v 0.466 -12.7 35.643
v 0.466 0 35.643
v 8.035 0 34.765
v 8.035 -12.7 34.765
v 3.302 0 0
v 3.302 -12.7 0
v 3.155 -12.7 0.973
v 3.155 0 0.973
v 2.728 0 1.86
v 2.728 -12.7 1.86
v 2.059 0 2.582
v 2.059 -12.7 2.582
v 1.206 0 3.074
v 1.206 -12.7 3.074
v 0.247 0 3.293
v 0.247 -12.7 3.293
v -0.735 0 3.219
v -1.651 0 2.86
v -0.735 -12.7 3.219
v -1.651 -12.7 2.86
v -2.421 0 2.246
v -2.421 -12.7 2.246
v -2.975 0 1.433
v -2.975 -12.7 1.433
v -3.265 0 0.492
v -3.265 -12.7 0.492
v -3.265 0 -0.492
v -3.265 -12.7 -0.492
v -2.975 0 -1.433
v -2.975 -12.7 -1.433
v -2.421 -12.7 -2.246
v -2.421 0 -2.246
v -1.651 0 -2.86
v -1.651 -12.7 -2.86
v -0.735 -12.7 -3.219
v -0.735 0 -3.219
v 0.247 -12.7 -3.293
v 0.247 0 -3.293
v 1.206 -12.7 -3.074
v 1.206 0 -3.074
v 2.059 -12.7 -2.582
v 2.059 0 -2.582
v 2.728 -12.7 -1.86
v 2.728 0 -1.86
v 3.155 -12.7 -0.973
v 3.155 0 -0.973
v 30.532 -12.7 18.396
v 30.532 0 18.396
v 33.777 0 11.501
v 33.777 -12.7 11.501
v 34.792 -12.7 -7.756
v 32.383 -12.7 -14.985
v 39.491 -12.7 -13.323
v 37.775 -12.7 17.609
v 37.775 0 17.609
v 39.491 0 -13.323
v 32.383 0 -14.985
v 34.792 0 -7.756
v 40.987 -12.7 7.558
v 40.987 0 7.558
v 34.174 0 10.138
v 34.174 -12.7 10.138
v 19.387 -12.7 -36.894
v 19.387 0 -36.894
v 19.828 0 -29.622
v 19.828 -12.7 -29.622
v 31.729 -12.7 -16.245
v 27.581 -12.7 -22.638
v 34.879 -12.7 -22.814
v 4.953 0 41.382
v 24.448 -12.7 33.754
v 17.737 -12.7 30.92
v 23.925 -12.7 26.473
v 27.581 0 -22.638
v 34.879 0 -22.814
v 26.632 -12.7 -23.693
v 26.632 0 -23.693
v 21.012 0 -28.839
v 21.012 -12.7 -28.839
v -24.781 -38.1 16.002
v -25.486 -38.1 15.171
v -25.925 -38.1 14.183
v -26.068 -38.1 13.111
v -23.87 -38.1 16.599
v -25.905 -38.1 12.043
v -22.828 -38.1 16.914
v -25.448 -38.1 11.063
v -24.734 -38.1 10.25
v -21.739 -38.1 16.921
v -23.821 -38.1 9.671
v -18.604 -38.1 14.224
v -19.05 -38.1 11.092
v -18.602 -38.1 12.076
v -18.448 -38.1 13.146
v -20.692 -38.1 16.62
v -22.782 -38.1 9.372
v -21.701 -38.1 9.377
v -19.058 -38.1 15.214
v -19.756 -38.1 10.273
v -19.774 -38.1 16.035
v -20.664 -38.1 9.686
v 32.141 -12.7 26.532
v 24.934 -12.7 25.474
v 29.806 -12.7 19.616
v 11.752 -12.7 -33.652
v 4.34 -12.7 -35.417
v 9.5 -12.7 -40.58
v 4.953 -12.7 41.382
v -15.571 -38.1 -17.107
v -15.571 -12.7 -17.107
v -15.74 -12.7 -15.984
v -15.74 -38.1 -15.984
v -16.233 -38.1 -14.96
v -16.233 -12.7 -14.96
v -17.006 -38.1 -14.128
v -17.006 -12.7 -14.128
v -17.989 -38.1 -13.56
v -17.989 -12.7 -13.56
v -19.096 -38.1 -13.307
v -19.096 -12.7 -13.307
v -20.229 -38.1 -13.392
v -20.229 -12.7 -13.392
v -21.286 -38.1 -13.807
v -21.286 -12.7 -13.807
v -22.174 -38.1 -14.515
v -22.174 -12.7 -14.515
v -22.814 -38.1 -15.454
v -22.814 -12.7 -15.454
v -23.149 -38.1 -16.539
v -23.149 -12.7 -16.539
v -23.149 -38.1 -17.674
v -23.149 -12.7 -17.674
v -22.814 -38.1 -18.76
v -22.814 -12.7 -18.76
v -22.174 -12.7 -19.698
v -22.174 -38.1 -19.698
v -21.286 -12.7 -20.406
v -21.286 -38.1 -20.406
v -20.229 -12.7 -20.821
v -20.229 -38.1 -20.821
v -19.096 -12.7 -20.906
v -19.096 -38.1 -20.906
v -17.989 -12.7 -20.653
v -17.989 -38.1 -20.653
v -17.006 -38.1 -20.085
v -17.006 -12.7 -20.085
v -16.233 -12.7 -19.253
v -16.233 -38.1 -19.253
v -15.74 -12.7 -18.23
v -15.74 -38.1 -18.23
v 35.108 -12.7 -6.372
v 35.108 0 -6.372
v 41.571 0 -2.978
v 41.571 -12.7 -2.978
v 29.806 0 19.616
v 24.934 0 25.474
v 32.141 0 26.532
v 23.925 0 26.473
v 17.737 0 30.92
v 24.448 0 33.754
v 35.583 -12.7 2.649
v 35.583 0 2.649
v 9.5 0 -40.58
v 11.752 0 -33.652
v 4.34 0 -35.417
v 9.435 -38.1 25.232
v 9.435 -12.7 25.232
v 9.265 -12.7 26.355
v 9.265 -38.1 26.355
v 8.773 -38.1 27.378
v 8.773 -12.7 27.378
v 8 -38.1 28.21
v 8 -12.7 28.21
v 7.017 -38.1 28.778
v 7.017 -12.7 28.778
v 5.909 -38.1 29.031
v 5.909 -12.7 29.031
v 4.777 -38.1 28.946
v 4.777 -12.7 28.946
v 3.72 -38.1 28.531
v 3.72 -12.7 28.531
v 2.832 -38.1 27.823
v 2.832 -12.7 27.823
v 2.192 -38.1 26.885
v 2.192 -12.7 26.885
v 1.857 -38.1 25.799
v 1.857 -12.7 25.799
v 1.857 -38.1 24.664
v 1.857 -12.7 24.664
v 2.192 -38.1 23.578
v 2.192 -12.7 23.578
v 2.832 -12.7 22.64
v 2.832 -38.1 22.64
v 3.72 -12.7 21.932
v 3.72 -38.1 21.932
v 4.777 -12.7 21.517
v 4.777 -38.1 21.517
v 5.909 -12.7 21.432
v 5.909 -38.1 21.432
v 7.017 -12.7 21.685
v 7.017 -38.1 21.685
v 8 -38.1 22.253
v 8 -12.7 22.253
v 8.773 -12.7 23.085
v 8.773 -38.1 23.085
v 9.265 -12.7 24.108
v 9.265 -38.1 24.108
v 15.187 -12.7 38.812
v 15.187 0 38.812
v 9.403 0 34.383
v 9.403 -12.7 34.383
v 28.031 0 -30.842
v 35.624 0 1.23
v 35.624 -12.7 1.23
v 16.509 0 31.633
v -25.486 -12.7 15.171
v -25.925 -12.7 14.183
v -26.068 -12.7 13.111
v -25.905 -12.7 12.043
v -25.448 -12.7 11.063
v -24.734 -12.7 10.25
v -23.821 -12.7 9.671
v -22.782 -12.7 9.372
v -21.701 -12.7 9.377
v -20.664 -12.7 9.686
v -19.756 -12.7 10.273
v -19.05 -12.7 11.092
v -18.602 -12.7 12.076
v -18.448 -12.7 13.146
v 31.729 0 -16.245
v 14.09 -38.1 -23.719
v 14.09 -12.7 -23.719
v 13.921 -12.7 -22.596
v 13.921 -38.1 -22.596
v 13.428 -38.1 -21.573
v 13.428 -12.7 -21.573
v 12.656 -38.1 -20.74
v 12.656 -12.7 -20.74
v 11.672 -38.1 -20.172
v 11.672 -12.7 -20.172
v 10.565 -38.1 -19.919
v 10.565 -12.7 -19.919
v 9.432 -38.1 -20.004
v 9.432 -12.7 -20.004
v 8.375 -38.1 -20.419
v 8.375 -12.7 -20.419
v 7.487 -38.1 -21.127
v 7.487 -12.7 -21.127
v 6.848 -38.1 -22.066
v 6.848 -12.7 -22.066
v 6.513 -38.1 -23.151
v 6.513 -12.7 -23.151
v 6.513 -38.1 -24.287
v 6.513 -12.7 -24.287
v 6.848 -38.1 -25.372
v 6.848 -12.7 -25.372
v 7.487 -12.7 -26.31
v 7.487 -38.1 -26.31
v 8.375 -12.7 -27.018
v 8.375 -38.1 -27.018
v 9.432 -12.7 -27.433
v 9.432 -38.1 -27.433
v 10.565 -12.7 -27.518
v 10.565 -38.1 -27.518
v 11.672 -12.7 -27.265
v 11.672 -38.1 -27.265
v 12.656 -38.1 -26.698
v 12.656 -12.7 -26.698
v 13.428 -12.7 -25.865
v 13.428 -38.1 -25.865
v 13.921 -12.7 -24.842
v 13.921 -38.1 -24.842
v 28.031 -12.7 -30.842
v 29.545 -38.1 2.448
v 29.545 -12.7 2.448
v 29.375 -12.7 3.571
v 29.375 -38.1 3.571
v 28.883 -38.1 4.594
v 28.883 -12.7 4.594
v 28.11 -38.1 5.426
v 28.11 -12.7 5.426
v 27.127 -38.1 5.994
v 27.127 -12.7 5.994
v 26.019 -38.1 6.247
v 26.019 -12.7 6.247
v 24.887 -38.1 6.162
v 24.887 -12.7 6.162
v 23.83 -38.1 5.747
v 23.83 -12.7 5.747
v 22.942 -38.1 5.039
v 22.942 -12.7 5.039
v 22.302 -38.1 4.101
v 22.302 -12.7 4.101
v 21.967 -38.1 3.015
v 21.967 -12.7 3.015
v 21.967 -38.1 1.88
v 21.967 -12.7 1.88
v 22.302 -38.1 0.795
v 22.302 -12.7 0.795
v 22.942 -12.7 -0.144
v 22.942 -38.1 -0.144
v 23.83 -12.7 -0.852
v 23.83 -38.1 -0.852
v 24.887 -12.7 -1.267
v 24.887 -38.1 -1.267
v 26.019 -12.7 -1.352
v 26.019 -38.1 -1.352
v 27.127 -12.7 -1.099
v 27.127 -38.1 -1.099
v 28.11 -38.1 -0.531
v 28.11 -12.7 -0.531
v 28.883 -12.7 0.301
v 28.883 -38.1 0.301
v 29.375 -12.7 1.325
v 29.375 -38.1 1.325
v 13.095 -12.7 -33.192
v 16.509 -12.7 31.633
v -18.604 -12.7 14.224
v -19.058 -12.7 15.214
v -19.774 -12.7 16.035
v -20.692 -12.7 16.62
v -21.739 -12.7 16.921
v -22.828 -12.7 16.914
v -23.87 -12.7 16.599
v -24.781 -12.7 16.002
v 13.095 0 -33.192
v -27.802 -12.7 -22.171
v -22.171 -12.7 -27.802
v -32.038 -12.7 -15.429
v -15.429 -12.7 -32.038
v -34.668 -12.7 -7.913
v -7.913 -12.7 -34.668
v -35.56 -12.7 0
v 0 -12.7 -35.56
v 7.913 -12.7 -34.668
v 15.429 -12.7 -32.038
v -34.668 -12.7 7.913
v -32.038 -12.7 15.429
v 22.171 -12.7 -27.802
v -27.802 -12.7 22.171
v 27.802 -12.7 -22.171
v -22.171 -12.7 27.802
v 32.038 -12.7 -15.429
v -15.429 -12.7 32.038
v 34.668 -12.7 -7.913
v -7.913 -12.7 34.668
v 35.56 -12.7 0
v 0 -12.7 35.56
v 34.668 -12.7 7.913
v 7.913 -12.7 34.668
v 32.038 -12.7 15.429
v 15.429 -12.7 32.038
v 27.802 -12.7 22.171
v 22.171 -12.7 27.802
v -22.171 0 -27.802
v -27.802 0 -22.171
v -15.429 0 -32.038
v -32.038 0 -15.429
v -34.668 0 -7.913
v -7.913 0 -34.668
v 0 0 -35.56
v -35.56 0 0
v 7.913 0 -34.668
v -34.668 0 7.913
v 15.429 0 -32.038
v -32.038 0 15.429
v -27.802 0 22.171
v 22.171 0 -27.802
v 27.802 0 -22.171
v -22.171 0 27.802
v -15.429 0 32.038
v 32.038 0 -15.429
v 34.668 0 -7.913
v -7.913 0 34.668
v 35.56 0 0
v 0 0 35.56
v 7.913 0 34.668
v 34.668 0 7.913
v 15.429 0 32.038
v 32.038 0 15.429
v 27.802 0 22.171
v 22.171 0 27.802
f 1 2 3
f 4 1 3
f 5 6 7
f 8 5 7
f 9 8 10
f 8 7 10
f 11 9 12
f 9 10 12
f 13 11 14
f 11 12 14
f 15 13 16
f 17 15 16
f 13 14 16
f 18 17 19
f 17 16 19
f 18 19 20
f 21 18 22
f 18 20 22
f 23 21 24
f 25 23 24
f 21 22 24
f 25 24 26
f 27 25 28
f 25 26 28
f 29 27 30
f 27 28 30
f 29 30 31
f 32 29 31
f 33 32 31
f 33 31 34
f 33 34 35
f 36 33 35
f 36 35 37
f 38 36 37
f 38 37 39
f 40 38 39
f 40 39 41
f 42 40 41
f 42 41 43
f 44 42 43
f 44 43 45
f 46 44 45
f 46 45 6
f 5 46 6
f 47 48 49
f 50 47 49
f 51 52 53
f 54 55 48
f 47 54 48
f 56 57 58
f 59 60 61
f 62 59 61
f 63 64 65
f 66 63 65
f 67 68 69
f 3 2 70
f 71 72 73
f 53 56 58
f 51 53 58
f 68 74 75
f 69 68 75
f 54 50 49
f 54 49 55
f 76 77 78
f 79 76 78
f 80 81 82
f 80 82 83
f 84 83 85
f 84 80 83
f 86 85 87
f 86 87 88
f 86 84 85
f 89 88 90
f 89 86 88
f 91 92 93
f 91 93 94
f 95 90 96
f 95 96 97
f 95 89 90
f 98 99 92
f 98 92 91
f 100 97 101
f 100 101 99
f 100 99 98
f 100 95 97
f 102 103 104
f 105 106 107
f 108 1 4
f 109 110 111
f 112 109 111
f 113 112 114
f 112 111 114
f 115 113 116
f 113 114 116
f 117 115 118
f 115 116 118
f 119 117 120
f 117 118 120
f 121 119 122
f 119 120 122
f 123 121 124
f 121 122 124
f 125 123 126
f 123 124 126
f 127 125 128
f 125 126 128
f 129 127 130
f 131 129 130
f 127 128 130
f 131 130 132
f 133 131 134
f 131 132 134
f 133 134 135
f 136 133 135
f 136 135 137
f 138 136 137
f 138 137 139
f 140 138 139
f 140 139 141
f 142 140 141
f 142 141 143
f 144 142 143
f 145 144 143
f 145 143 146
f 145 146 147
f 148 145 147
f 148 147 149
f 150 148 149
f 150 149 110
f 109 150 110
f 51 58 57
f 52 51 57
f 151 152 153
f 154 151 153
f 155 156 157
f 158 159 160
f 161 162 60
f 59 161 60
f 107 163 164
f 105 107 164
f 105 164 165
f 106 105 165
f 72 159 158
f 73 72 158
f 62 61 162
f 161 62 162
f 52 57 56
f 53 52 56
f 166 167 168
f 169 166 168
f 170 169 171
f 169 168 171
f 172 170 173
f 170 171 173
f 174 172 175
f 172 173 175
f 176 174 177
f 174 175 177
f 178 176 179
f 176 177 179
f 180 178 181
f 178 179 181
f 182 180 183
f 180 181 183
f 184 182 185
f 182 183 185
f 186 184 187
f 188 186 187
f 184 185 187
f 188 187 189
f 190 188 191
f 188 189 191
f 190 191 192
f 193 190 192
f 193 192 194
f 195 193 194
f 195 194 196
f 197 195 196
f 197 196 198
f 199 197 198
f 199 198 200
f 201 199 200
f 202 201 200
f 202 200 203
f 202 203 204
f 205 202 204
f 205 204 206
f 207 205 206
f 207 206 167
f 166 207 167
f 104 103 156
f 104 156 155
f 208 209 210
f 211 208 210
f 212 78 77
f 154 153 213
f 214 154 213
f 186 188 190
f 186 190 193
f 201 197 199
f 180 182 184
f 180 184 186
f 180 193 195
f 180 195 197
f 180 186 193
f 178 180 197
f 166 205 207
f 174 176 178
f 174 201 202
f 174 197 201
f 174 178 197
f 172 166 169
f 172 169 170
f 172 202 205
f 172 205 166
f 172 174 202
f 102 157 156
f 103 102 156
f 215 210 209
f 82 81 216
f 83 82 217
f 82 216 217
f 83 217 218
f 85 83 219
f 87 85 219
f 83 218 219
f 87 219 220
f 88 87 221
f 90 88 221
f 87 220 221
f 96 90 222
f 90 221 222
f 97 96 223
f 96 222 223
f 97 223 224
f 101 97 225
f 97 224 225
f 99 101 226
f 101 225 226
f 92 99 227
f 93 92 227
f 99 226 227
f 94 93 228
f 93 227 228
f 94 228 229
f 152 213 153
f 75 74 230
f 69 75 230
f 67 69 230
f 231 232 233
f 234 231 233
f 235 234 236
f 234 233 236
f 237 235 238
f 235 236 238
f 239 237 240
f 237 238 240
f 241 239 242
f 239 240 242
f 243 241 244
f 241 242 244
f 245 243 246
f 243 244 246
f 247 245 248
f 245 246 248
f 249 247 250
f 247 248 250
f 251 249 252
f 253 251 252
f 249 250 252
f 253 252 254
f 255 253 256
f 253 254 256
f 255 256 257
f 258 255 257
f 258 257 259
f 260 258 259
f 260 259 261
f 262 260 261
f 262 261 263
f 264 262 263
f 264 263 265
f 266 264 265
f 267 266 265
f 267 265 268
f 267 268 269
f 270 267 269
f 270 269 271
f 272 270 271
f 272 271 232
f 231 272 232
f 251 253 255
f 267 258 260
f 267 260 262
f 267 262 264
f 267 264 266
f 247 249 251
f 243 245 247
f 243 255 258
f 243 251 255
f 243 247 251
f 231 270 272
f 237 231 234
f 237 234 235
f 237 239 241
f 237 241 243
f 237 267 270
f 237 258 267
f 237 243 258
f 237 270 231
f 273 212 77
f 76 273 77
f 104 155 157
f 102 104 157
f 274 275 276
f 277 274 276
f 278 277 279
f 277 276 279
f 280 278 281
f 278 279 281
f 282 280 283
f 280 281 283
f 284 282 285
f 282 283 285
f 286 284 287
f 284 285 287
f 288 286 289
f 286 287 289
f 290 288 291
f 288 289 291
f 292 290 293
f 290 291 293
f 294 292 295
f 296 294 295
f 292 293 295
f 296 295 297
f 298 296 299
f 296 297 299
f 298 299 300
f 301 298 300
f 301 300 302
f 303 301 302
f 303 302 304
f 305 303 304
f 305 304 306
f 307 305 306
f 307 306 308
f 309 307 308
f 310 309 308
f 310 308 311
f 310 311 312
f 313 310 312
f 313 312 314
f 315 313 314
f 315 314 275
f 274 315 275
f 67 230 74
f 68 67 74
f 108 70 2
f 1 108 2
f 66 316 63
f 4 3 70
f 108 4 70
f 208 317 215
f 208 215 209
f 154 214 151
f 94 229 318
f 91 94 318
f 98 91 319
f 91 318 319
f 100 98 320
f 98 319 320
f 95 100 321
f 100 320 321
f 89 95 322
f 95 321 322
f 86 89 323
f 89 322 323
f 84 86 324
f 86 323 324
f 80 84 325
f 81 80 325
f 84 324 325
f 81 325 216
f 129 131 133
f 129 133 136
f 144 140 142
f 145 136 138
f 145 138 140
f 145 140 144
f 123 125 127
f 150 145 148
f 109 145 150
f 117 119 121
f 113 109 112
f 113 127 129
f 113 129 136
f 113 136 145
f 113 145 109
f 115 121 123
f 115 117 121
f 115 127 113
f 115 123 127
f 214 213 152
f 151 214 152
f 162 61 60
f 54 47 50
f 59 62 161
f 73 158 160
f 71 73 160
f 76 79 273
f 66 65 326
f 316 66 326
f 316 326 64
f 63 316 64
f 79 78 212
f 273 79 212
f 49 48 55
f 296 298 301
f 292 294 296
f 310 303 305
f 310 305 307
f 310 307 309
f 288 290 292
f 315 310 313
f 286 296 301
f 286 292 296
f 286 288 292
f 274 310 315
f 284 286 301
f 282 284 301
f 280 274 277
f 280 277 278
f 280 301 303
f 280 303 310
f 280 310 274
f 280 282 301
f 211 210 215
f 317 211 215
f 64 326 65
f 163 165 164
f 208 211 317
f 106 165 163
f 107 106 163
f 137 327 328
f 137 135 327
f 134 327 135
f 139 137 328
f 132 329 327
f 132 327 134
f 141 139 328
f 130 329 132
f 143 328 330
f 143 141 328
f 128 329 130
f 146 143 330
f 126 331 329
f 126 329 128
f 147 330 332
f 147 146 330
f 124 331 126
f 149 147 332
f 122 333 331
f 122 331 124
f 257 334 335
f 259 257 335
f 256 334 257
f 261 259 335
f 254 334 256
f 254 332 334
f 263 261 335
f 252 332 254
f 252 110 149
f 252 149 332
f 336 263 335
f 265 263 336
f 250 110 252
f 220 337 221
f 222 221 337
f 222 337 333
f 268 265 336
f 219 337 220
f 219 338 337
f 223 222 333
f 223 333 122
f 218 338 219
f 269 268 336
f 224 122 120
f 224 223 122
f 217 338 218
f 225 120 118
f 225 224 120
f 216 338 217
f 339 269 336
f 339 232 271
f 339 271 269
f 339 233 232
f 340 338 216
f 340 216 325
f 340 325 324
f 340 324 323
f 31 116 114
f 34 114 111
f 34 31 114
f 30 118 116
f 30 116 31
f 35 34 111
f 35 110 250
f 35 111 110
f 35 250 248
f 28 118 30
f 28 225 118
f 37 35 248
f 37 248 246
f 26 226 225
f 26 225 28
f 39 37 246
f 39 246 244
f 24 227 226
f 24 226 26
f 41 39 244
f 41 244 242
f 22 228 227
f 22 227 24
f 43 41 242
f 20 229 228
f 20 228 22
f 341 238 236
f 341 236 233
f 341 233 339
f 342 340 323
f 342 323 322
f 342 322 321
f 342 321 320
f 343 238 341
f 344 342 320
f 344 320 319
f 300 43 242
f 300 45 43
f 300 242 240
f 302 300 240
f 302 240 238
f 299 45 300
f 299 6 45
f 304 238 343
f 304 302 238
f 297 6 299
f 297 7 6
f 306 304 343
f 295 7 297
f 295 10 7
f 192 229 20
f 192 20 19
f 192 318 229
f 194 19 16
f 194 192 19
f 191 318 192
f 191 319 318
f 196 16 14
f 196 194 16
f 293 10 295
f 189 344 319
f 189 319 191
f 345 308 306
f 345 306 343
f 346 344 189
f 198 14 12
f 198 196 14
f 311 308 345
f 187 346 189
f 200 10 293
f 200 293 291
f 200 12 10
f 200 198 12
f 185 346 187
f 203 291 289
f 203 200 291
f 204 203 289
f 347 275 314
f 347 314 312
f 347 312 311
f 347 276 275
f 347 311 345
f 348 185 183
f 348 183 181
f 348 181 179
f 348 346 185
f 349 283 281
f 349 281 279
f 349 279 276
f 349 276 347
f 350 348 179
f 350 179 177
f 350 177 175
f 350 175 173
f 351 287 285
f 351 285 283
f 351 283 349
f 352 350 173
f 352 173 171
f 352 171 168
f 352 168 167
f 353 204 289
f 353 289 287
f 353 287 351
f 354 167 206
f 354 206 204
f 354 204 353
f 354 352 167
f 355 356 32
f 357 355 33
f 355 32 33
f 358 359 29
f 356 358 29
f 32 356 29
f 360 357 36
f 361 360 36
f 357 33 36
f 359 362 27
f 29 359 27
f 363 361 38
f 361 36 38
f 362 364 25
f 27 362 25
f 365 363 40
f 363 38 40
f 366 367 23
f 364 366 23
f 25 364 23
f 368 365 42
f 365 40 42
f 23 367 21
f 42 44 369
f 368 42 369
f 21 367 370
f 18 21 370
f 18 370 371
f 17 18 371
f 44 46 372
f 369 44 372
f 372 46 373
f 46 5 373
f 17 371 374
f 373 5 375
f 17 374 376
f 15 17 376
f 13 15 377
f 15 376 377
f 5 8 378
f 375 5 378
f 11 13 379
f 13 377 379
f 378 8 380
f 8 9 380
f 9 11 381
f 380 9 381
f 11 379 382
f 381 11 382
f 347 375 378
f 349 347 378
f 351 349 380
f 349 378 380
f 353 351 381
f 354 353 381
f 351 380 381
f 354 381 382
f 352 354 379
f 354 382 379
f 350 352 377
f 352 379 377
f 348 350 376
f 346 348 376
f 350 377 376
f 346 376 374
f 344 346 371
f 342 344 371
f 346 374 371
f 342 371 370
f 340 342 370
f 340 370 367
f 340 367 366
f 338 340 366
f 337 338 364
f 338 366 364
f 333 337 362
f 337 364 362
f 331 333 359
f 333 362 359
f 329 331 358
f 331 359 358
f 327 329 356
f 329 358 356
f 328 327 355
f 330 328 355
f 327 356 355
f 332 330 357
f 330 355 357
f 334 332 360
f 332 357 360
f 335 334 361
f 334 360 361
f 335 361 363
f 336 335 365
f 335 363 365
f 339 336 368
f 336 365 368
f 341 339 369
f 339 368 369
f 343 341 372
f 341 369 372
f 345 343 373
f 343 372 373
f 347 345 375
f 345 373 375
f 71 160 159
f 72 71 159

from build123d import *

# Parameters (mm, degrees)
F0_R     = 35.56
F5_DEPTH = 12.7
F3_R     = 3.81
F6_DEPTH = 38.1
F7_R     = 3.302
F8_DEPTH = 25.4


with BuildPart() as f5:
    # F0 (on Front) → F5 (new body)
    with BuildSketch(Plane.XZ):
        Circle(F0_R)
    extrude(amount=F5_DEPTH)

    # F3 (on face) → F6 (join)
    with BuildSketch(Plane.XZ):
        with Locations((5.6246439926, 25.2315048128)):
            Circle(F3_R)
        with BuildLine():
            ThreePointArc((-25.4857693866, 15.1713318157), (-23.3120689257, 9.4848917441), (-18.4484764871, 13.1463181019))
            ThreePointArc((-18.4484764871, 13.1463181019), (-21.2048840486, 16.8077444596), (-25.4857693866, 15.1713318157))
        make_face()
        with Locations((-19.3811389995, -17.106633399)):
            Circle(F3_R)
        with Locations((10.2802738448, -23.7187989755)):
            Circle(F3_R)
        with Locations((25.7346976492, 2.4476094598)):
            Circle(F3_R)
    extrude(amount=F6_DEPTH)

    # F7 (on face) → F8 (cut)
    with BuildSketch(Plane.XZ.offset(12.7)):
        Circle(F7_R)
    extrude(amount=-F8_DEPTH, mode=Mode.SUBTRACT)


with BuildPart() as f5b:
    # F2 (on Front) → F5, piece 2 (new body)
    with BuildSketch(Plane.XZ):
        Polygon((4.952570551, 41.3822282865), (0.4661103748, 35.6425658797), (8.0354463562, 34.7653242932), align=None)
    extrude(amount=F5_DEPTH)


with BuildPart() as f5c:
    # F2 (on Front) → F5, piece 3 (new body)
    with BuildSketch(Plane.XZ):
        Polygon((15.1868975727, 38.8120460055), (9.4027296107, 34.3831126752), (16.5091410856, 31.6329643247), align=None)
    extrude(amount=F5_DEPTH)


with BuildPart() as f5d:
    # F2 (on Front) → F5, piece 4 (new body)
    with BuildSketch(Plane.XZ):
        Polygon((24.4477050164, 33.7539107727), (17.7366094576, 30.9196126482), (23.9245569937, 26.4728491857), align=None)
    extrude(amount=F5_DEPTH)


with BuildPart() as f5e:
    # F2 (on Front) → F5, piece 5 (new body)
    with BuildSketch(Plane.XZ):
        Polygon((32.1413510727, 26.5320621934), (24.9335265727, 25.4740851458), (29.8063466614, 19.6157556584), align=None)
    extrude(amount=F5_DEPTH)


with BuildPart() as f5f:
    # F2 (on Front) → F5, piece 6 (new body)
    with BuildSketch(Plane.XZ):
        Polygon((37.7746530476, 17.6094395183), (30.5321398769, 18.3956026241), (33.777472095, 11.5012412472), align=None)
    extrude(amount=F5_DEPTH)


with BuildPart() as f5g:
    # F2 (on Front) → F5, piece 7 (new body)
    with BuildSketch(Plane.XZ):
        Polygon((40.9865016535, 7.5580060347), (34.1735637168, 10.137914197), (35.5833738401, 2.649467401), align=None)
    extrude(amount=F5_DEPTH)


with BuildPart() as f5h:
    # F2 (on Front) → F5, piece 8 (new body)
    with BuildSketch(Plane.XZ):
        Polygon((41.571009053, -2.9779152655), (35.6243733665, 1.2303591395), (35.1082889047, -6.3721441869), align=None)
    extrude(amount=F5_DEPTH)


with BuildPart() as f5i:
    # F2 (on Front) → F5, piece 9 (new body)
    with BuildSketch(Plane.XZ):
        Polygon((39.4907068037, -13.3229444629), (34.7915681596, -7.7560651342), (32.382671467, -14.9852847826), align=None)
    extrude(amount=F5_DEPTH)


with BuildPart() as f5j:
    # F2 (on Front) → F5, piece 10 (new body)
    with BuildSketch(Plane.XZ):
        Polygon((34.8789476827, -22.8139383177), (31.7285330727, -16.2453054888), (27.5812406837, -22.6378297038), align=None)
    extrude(amount=F5_DEPTH)


with BuildPart() as f5k:
    # F2 (on Front) → F5, piece 11 (new body)
    with BuildSketch(Plane.XZ):
        Polygon((28.0313574274, -30.8424994739), (26.6316166103, -23.693179569), (21.0117807384, -28.8392309459), align=None)
    extrude(amount=F5_DEPTH)


with BuildPart() as f5l:
    # F2 (on Front) → F5, piece 12 (new body)
    with BuildSketch(Plane.XZ):
        Polygon((19.3868843577, -36.8939763094), (19.8275443553, -29.6222593029), (13.0954110759, -33.1919625829), align=None)
    extrude(amount=F5_DEPTH)


with BuildPart() as f5m:
    # F2 (on Front) → F5, piece 13 (new body)
    with BuildSketch(Plane.XZ):
        Polygon((9.499661649, -40.5804534422), (11.7524750109, -33.6524752802), (4.3395915519, -35.417003212), align=None)
    extrude(amount=F5_DEPTH)


solid = Compound([f5.part, f5b.part, f5c.part, f5d.part, f5e.part, f5f.part, f5g.part, f5h.part, f5i.part, f5j.part, f5k.part, f5l.part, f5m.part])
